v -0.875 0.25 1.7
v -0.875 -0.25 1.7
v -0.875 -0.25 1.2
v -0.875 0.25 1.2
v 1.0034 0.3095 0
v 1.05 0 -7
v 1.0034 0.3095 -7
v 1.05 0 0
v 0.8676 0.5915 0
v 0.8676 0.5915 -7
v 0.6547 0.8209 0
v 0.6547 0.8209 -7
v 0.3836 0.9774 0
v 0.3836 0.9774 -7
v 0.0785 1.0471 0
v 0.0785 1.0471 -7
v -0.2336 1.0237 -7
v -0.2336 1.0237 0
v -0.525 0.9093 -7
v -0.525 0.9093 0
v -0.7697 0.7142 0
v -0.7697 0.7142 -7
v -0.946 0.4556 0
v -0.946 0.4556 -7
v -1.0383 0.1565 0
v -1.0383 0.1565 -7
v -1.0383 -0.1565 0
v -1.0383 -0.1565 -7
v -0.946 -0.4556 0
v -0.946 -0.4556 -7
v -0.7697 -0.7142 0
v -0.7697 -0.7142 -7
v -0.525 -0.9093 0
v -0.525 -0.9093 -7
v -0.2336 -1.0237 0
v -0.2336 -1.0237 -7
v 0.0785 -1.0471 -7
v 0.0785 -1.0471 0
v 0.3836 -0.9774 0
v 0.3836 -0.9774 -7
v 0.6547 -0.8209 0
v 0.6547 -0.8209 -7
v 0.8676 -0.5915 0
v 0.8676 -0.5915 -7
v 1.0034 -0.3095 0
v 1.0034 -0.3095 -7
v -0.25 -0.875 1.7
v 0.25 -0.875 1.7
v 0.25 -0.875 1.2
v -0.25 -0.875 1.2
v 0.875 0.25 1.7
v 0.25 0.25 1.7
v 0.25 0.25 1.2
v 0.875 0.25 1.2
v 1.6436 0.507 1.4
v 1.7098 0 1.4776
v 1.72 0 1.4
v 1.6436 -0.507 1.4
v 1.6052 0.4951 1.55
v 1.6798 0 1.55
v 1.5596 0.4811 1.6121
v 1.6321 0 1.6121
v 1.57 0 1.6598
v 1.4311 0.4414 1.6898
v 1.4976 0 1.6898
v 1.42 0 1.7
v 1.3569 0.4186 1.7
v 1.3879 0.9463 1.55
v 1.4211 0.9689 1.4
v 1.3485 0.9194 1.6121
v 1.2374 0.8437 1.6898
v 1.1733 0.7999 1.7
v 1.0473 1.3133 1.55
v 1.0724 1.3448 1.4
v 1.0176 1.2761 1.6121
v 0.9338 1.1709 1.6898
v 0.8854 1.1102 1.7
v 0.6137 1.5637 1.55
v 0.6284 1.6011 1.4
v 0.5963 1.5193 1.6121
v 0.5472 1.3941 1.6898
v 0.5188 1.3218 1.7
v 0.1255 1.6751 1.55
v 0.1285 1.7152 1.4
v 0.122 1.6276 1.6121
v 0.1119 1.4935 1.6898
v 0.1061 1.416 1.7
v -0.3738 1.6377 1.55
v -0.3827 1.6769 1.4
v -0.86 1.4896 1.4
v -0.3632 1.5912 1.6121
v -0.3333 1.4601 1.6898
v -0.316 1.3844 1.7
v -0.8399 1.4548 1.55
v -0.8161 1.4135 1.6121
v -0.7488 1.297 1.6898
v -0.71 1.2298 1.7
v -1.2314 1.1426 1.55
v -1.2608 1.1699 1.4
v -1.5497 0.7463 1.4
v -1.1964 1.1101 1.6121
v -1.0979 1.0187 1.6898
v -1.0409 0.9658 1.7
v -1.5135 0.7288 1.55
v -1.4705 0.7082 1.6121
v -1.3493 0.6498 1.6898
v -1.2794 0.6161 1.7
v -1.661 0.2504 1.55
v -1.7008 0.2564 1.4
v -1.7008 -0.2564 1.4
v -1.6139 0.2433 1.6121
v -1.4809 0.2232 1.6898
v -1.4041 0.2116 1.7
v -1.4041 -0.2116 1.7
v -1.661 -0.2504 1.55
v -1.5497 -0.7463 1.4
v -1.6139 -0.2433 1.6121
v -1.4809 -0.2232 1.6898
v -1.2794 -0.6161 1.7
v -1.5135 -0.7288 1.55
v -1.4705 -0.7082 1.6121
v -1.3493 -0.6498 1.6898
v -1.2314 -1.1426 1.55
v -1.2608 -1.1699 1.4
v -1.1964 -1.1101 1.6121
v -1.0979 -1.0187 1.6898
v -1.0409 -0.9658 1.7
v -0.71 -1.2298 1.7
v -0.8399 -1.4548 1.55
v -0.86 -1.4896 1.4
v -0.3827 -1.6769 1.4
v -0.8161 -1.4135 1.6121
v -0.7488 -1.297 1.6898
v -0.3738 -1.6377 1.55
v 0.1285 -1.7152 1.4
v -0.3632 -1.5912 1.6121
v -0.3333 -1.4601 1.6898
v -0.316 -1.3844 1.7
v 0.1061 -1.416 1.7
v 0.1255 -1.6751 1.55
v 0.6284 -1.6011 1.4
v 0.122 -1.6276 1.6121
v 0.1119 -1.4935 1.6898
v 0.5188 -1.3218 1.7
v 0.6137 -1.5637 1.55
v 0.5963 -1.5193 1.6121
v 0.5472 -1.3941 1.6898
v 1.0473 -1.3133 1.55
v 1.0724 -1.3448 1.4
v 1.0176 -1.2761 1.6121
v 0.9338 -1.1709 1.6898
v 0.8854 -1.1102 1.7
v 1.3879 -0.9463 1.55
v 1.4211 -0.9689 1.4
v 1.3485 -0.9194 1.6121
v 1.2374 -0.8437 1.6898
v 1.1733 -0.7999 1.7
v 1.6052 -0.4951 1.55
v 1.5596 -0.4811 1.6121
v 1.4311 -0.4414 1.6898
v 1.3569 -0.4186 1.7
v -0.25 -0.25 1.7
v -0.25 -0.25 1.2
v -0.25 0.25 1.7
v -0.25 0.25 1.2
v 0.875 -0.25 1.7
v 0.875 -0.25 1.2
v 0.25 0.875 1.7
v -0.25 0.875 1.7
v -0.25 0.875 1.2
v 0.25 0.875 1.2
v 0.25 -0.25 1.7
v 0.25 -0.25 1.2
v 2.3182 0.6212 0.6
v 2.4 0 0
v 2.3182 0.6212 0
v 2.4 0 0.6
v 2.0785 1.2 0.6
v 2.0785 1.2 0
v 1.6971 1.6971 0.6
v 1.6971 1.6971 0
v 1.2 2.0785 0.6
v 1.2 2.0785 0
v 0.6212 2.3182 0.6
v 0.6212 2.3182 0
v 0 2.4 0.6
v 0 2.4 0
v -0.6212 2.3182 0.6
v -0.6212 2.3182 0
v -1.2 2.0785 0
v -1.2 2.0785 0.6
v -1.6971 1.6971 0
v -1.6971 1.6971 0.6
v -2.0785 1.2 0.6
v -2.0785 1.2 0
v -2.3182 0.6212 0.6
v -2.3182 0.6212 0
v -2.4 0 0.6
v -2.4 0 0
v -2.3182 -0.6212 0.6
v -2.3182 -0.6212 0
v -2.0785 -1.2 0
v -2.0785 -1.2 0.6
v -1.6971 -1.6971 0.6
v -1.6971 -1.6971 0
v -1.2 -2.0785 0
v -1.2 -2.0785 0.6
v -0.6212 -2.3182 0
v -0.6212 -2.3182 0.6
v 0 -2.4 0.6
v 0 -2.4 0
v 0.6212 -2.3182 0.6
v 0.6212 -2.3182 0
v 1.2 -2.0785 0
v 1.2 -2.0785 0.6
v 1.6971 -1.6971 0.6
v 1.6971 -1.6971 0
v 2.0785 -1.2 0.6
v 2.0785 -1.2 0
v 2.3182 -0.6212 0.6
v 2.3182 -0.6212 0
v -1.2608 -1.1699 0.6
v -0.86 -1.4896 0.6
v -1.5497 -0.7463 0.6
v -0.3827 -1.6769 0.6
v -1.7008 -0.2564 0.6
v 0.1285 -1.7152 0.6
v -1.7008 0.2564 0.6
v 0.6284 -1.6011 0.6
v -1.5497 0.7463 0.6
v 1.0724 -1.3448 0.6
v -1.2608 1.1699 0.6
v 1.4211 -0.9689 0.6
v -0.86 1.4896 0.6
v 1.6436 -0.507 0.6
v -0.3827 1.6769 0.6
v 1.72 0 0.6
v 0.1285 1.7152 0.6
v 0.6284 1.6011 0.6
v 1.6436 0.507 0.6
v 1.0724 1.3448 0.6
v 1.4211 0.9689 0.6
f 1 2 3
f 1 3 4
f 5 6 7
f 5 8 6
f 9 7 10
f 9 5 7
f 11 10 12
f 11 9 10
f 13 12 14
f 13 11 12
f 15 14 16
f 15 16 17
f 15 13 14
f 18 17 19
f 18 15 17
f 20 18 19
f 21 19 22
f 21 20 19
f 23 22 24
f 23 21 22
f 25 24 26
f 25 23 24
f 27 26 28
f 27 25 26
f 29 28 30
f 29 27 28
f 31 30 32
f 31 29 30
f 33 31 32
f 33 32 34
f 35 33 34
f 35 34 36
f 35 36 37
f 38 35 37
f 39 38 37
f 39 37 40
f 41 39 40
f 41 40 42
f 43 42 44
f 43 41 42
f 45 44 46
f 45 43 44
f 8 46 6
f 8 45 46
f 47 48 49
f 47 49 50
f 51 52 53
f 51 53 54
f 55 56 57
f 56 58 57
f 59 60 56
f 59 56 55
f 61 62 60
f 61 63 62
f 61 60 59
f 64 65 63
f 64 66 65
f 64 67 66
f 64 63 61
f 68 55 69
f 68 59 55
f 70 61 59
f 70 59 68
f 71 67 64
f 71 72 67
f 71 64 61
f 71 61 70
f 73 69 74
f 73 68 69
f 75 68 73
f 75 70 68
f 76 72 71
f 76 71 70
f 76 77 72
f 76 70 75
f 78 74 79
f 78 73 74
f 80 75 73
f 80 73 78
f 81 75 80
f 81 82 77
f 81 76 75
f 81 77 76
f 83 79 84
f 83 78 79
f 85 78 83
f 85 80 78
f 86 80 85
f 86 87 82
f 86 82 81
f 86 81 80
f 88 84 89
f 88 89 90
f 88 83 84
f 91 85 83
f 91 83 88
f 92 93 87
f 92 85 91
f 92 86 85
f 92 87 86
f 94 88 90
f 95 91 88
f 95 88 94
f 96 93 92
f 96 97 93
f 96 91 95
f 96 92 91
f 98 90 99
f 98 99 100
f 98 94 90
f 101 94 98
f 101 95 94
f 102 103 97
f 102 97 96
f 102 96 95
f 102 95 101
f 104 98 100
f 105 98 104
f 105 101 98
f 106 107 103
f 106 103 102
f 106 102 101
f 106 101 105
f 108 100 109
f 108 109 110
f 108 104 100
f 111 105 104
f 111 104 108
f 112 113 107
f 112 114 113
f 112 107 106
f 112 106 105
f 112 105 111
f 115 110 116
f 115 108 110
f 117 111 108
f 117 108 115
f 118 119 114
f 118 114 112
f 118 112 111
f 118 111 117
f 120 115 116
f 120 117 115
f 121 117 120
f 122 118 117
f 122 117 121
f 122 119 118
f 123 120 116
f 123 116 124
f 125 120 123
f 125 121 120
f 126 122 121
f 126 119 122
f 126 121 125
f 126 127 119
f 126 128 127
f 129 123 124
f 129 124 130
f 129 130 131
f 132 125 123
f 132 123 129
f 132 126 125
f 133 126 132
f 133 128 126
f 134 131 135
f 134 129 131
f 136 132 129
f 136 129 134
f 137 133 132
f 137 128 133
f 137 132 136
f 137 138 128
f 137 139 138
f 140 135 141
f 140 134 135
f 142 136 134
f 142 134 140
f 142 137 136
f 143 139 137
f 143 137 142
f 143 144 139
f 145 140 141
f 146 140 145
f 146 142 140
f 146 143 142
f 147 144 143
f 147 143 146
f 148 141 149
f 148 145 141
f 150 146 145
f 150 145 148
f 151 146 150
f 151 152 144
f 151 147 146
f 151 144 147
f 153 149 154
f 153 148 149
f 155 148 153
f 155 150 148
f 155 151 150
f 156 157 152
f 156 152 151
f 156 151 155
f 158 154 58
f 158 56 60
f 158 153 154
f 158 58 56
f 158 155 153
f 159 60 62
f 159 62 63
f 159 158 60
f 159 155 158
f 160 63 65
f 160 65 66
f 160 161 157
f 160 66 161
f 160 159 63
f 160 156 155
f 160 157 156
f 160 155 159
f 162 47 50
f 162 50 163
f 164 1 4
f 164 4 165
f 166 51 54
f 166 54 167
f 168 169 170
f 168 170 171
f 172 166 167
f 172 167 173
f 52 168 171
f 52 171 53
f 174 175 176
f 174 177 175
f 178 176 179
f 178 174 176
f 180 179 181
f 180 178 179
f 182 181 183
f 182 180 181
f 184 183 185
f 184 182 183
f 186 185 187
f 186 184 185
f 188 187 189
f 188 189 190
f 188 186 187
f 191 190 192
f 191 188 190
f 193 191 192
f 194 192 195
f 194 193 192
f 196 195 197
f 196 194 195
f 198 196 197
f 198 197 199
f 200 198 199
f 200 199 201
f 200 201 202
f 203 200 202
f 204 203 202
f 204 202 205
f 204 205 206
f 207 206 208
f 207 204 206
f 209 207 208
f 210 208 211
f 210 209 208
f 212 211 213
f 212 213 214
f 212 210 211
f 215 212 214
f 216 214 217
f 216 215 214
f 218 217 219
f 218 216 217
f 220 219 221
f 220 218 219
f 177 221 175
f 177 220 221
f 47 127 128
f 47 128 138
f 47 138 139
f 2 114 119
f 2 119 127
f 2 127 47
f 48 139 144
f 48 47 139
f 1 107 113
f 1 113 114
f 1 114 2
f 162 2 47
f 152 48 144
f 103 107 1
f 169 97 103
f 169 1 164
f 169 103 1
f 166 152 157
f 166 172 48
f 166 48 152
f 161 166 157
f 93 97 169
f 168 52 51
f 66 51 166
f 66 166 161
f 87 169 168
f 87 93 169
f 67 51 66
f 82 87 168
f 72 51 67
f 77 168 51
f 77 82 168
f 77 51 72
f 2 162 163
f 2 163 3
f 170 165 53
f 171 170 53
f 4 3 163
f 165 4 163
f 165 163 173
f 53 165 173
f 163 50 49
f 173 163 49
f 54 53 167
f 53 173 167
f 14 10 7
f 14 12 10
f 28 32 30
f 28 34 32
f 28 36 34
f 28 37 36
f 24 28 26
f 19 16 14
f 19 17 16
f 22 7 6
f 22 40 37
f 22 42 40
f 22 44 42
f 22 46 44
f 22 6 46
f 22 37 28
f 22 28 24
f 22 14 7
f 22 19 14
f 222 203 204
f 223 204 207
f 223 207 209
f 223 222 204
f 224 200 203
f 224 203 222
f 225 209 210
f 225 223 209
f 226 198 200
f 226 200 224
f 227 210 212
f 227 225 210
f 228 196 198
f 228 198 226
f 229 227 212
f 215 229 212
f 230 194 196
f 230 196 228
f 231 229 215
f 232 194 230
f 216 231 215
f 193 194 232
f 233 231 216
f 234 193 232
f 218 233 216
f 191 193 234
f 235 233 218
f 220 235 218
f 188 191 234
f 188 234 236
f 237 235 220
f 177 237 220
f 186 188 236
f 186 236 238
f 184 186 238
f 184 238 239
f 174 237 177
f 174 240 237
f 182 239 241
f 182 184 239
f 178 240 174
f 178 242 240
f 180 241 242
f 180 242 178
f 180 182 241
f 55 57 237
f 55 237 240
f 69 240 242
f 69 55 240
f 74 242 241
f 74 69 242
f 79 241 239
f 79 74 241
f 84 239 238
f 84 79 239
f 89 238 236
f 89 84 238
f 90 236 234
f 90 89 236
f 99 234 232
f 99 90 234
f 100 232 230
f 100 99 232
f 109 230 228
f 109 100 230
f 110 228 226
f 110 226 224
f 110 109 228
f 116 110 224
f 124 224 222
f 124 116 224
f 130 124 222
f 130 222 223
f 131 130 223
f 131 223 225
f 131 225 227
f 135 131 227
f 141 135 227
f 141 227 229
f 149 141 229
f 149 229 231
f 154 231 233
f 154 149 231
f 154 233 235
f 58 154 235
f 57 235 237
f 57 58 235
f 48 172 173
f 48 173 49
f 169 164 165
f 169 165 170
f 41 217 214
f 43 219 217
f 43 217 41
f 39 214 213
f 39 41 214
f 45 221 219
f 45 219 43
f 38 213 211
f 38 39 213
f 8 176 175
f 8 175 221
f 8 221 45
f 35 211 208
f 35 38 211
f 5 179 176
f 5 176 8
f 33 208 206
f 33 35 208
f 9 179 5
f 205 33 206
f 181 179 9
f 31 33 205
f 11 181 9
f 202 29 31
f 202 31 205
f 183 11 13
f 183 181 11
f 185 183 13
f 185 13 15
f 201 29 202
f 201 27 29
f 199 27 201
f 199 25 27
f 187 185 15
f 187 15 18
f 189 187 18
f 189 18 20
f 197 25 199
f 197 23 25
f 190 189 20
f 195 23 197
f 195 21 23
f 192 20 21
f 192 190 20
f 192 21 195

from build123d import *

# Parameters (mm, degrees)
POCKET_DEPTH = 0.5
FILLET_R     = 0.3


with BuildPart() as part:
    # Sketch001 → Revolution (revolve)
    with BuildSketch(Plane.XZ):
        Polygon((1.05, -7), (1.05, 0), (2.4, 0), (2.4, 0.6), (1.72, 0.6), (1.72, 1.7), (0, 1.7), (0, -7), align=None)
    revolve(axis=Axis((0, 0, 0), (0, 0, 1)))

    # Sketch → Pocket (cut)
    with BuildSketch(Plane(origin=(0, 0, 1.7), x_dir=(-1, 0, 0), z_dir=(0, 0, 1))):
        Polygon((-0.25, 0.875), (0.25, 0.875), (0.25, 0.25), (0.875, 0.25), (0.875, -0.25), (0.25, -0.25), (0.25, -0.875), (-0.25, -0.875), (-0.25, -0.25), (-0.875, -0.25), (-0.875, 0.25), (-0.25, 0.25), align=None)
    extrude(amount=-POCKET_DEPTH, mode=Mode.SUBTRACT)

    # Fillet
    fillet_edges = [part.edges().sort_by_distance(p)[0] for p in [
        (-1.72, 0, 1.7),
    ]]
    fillet(fillet_edges, radius=FILLET_R)


solid = part.part
